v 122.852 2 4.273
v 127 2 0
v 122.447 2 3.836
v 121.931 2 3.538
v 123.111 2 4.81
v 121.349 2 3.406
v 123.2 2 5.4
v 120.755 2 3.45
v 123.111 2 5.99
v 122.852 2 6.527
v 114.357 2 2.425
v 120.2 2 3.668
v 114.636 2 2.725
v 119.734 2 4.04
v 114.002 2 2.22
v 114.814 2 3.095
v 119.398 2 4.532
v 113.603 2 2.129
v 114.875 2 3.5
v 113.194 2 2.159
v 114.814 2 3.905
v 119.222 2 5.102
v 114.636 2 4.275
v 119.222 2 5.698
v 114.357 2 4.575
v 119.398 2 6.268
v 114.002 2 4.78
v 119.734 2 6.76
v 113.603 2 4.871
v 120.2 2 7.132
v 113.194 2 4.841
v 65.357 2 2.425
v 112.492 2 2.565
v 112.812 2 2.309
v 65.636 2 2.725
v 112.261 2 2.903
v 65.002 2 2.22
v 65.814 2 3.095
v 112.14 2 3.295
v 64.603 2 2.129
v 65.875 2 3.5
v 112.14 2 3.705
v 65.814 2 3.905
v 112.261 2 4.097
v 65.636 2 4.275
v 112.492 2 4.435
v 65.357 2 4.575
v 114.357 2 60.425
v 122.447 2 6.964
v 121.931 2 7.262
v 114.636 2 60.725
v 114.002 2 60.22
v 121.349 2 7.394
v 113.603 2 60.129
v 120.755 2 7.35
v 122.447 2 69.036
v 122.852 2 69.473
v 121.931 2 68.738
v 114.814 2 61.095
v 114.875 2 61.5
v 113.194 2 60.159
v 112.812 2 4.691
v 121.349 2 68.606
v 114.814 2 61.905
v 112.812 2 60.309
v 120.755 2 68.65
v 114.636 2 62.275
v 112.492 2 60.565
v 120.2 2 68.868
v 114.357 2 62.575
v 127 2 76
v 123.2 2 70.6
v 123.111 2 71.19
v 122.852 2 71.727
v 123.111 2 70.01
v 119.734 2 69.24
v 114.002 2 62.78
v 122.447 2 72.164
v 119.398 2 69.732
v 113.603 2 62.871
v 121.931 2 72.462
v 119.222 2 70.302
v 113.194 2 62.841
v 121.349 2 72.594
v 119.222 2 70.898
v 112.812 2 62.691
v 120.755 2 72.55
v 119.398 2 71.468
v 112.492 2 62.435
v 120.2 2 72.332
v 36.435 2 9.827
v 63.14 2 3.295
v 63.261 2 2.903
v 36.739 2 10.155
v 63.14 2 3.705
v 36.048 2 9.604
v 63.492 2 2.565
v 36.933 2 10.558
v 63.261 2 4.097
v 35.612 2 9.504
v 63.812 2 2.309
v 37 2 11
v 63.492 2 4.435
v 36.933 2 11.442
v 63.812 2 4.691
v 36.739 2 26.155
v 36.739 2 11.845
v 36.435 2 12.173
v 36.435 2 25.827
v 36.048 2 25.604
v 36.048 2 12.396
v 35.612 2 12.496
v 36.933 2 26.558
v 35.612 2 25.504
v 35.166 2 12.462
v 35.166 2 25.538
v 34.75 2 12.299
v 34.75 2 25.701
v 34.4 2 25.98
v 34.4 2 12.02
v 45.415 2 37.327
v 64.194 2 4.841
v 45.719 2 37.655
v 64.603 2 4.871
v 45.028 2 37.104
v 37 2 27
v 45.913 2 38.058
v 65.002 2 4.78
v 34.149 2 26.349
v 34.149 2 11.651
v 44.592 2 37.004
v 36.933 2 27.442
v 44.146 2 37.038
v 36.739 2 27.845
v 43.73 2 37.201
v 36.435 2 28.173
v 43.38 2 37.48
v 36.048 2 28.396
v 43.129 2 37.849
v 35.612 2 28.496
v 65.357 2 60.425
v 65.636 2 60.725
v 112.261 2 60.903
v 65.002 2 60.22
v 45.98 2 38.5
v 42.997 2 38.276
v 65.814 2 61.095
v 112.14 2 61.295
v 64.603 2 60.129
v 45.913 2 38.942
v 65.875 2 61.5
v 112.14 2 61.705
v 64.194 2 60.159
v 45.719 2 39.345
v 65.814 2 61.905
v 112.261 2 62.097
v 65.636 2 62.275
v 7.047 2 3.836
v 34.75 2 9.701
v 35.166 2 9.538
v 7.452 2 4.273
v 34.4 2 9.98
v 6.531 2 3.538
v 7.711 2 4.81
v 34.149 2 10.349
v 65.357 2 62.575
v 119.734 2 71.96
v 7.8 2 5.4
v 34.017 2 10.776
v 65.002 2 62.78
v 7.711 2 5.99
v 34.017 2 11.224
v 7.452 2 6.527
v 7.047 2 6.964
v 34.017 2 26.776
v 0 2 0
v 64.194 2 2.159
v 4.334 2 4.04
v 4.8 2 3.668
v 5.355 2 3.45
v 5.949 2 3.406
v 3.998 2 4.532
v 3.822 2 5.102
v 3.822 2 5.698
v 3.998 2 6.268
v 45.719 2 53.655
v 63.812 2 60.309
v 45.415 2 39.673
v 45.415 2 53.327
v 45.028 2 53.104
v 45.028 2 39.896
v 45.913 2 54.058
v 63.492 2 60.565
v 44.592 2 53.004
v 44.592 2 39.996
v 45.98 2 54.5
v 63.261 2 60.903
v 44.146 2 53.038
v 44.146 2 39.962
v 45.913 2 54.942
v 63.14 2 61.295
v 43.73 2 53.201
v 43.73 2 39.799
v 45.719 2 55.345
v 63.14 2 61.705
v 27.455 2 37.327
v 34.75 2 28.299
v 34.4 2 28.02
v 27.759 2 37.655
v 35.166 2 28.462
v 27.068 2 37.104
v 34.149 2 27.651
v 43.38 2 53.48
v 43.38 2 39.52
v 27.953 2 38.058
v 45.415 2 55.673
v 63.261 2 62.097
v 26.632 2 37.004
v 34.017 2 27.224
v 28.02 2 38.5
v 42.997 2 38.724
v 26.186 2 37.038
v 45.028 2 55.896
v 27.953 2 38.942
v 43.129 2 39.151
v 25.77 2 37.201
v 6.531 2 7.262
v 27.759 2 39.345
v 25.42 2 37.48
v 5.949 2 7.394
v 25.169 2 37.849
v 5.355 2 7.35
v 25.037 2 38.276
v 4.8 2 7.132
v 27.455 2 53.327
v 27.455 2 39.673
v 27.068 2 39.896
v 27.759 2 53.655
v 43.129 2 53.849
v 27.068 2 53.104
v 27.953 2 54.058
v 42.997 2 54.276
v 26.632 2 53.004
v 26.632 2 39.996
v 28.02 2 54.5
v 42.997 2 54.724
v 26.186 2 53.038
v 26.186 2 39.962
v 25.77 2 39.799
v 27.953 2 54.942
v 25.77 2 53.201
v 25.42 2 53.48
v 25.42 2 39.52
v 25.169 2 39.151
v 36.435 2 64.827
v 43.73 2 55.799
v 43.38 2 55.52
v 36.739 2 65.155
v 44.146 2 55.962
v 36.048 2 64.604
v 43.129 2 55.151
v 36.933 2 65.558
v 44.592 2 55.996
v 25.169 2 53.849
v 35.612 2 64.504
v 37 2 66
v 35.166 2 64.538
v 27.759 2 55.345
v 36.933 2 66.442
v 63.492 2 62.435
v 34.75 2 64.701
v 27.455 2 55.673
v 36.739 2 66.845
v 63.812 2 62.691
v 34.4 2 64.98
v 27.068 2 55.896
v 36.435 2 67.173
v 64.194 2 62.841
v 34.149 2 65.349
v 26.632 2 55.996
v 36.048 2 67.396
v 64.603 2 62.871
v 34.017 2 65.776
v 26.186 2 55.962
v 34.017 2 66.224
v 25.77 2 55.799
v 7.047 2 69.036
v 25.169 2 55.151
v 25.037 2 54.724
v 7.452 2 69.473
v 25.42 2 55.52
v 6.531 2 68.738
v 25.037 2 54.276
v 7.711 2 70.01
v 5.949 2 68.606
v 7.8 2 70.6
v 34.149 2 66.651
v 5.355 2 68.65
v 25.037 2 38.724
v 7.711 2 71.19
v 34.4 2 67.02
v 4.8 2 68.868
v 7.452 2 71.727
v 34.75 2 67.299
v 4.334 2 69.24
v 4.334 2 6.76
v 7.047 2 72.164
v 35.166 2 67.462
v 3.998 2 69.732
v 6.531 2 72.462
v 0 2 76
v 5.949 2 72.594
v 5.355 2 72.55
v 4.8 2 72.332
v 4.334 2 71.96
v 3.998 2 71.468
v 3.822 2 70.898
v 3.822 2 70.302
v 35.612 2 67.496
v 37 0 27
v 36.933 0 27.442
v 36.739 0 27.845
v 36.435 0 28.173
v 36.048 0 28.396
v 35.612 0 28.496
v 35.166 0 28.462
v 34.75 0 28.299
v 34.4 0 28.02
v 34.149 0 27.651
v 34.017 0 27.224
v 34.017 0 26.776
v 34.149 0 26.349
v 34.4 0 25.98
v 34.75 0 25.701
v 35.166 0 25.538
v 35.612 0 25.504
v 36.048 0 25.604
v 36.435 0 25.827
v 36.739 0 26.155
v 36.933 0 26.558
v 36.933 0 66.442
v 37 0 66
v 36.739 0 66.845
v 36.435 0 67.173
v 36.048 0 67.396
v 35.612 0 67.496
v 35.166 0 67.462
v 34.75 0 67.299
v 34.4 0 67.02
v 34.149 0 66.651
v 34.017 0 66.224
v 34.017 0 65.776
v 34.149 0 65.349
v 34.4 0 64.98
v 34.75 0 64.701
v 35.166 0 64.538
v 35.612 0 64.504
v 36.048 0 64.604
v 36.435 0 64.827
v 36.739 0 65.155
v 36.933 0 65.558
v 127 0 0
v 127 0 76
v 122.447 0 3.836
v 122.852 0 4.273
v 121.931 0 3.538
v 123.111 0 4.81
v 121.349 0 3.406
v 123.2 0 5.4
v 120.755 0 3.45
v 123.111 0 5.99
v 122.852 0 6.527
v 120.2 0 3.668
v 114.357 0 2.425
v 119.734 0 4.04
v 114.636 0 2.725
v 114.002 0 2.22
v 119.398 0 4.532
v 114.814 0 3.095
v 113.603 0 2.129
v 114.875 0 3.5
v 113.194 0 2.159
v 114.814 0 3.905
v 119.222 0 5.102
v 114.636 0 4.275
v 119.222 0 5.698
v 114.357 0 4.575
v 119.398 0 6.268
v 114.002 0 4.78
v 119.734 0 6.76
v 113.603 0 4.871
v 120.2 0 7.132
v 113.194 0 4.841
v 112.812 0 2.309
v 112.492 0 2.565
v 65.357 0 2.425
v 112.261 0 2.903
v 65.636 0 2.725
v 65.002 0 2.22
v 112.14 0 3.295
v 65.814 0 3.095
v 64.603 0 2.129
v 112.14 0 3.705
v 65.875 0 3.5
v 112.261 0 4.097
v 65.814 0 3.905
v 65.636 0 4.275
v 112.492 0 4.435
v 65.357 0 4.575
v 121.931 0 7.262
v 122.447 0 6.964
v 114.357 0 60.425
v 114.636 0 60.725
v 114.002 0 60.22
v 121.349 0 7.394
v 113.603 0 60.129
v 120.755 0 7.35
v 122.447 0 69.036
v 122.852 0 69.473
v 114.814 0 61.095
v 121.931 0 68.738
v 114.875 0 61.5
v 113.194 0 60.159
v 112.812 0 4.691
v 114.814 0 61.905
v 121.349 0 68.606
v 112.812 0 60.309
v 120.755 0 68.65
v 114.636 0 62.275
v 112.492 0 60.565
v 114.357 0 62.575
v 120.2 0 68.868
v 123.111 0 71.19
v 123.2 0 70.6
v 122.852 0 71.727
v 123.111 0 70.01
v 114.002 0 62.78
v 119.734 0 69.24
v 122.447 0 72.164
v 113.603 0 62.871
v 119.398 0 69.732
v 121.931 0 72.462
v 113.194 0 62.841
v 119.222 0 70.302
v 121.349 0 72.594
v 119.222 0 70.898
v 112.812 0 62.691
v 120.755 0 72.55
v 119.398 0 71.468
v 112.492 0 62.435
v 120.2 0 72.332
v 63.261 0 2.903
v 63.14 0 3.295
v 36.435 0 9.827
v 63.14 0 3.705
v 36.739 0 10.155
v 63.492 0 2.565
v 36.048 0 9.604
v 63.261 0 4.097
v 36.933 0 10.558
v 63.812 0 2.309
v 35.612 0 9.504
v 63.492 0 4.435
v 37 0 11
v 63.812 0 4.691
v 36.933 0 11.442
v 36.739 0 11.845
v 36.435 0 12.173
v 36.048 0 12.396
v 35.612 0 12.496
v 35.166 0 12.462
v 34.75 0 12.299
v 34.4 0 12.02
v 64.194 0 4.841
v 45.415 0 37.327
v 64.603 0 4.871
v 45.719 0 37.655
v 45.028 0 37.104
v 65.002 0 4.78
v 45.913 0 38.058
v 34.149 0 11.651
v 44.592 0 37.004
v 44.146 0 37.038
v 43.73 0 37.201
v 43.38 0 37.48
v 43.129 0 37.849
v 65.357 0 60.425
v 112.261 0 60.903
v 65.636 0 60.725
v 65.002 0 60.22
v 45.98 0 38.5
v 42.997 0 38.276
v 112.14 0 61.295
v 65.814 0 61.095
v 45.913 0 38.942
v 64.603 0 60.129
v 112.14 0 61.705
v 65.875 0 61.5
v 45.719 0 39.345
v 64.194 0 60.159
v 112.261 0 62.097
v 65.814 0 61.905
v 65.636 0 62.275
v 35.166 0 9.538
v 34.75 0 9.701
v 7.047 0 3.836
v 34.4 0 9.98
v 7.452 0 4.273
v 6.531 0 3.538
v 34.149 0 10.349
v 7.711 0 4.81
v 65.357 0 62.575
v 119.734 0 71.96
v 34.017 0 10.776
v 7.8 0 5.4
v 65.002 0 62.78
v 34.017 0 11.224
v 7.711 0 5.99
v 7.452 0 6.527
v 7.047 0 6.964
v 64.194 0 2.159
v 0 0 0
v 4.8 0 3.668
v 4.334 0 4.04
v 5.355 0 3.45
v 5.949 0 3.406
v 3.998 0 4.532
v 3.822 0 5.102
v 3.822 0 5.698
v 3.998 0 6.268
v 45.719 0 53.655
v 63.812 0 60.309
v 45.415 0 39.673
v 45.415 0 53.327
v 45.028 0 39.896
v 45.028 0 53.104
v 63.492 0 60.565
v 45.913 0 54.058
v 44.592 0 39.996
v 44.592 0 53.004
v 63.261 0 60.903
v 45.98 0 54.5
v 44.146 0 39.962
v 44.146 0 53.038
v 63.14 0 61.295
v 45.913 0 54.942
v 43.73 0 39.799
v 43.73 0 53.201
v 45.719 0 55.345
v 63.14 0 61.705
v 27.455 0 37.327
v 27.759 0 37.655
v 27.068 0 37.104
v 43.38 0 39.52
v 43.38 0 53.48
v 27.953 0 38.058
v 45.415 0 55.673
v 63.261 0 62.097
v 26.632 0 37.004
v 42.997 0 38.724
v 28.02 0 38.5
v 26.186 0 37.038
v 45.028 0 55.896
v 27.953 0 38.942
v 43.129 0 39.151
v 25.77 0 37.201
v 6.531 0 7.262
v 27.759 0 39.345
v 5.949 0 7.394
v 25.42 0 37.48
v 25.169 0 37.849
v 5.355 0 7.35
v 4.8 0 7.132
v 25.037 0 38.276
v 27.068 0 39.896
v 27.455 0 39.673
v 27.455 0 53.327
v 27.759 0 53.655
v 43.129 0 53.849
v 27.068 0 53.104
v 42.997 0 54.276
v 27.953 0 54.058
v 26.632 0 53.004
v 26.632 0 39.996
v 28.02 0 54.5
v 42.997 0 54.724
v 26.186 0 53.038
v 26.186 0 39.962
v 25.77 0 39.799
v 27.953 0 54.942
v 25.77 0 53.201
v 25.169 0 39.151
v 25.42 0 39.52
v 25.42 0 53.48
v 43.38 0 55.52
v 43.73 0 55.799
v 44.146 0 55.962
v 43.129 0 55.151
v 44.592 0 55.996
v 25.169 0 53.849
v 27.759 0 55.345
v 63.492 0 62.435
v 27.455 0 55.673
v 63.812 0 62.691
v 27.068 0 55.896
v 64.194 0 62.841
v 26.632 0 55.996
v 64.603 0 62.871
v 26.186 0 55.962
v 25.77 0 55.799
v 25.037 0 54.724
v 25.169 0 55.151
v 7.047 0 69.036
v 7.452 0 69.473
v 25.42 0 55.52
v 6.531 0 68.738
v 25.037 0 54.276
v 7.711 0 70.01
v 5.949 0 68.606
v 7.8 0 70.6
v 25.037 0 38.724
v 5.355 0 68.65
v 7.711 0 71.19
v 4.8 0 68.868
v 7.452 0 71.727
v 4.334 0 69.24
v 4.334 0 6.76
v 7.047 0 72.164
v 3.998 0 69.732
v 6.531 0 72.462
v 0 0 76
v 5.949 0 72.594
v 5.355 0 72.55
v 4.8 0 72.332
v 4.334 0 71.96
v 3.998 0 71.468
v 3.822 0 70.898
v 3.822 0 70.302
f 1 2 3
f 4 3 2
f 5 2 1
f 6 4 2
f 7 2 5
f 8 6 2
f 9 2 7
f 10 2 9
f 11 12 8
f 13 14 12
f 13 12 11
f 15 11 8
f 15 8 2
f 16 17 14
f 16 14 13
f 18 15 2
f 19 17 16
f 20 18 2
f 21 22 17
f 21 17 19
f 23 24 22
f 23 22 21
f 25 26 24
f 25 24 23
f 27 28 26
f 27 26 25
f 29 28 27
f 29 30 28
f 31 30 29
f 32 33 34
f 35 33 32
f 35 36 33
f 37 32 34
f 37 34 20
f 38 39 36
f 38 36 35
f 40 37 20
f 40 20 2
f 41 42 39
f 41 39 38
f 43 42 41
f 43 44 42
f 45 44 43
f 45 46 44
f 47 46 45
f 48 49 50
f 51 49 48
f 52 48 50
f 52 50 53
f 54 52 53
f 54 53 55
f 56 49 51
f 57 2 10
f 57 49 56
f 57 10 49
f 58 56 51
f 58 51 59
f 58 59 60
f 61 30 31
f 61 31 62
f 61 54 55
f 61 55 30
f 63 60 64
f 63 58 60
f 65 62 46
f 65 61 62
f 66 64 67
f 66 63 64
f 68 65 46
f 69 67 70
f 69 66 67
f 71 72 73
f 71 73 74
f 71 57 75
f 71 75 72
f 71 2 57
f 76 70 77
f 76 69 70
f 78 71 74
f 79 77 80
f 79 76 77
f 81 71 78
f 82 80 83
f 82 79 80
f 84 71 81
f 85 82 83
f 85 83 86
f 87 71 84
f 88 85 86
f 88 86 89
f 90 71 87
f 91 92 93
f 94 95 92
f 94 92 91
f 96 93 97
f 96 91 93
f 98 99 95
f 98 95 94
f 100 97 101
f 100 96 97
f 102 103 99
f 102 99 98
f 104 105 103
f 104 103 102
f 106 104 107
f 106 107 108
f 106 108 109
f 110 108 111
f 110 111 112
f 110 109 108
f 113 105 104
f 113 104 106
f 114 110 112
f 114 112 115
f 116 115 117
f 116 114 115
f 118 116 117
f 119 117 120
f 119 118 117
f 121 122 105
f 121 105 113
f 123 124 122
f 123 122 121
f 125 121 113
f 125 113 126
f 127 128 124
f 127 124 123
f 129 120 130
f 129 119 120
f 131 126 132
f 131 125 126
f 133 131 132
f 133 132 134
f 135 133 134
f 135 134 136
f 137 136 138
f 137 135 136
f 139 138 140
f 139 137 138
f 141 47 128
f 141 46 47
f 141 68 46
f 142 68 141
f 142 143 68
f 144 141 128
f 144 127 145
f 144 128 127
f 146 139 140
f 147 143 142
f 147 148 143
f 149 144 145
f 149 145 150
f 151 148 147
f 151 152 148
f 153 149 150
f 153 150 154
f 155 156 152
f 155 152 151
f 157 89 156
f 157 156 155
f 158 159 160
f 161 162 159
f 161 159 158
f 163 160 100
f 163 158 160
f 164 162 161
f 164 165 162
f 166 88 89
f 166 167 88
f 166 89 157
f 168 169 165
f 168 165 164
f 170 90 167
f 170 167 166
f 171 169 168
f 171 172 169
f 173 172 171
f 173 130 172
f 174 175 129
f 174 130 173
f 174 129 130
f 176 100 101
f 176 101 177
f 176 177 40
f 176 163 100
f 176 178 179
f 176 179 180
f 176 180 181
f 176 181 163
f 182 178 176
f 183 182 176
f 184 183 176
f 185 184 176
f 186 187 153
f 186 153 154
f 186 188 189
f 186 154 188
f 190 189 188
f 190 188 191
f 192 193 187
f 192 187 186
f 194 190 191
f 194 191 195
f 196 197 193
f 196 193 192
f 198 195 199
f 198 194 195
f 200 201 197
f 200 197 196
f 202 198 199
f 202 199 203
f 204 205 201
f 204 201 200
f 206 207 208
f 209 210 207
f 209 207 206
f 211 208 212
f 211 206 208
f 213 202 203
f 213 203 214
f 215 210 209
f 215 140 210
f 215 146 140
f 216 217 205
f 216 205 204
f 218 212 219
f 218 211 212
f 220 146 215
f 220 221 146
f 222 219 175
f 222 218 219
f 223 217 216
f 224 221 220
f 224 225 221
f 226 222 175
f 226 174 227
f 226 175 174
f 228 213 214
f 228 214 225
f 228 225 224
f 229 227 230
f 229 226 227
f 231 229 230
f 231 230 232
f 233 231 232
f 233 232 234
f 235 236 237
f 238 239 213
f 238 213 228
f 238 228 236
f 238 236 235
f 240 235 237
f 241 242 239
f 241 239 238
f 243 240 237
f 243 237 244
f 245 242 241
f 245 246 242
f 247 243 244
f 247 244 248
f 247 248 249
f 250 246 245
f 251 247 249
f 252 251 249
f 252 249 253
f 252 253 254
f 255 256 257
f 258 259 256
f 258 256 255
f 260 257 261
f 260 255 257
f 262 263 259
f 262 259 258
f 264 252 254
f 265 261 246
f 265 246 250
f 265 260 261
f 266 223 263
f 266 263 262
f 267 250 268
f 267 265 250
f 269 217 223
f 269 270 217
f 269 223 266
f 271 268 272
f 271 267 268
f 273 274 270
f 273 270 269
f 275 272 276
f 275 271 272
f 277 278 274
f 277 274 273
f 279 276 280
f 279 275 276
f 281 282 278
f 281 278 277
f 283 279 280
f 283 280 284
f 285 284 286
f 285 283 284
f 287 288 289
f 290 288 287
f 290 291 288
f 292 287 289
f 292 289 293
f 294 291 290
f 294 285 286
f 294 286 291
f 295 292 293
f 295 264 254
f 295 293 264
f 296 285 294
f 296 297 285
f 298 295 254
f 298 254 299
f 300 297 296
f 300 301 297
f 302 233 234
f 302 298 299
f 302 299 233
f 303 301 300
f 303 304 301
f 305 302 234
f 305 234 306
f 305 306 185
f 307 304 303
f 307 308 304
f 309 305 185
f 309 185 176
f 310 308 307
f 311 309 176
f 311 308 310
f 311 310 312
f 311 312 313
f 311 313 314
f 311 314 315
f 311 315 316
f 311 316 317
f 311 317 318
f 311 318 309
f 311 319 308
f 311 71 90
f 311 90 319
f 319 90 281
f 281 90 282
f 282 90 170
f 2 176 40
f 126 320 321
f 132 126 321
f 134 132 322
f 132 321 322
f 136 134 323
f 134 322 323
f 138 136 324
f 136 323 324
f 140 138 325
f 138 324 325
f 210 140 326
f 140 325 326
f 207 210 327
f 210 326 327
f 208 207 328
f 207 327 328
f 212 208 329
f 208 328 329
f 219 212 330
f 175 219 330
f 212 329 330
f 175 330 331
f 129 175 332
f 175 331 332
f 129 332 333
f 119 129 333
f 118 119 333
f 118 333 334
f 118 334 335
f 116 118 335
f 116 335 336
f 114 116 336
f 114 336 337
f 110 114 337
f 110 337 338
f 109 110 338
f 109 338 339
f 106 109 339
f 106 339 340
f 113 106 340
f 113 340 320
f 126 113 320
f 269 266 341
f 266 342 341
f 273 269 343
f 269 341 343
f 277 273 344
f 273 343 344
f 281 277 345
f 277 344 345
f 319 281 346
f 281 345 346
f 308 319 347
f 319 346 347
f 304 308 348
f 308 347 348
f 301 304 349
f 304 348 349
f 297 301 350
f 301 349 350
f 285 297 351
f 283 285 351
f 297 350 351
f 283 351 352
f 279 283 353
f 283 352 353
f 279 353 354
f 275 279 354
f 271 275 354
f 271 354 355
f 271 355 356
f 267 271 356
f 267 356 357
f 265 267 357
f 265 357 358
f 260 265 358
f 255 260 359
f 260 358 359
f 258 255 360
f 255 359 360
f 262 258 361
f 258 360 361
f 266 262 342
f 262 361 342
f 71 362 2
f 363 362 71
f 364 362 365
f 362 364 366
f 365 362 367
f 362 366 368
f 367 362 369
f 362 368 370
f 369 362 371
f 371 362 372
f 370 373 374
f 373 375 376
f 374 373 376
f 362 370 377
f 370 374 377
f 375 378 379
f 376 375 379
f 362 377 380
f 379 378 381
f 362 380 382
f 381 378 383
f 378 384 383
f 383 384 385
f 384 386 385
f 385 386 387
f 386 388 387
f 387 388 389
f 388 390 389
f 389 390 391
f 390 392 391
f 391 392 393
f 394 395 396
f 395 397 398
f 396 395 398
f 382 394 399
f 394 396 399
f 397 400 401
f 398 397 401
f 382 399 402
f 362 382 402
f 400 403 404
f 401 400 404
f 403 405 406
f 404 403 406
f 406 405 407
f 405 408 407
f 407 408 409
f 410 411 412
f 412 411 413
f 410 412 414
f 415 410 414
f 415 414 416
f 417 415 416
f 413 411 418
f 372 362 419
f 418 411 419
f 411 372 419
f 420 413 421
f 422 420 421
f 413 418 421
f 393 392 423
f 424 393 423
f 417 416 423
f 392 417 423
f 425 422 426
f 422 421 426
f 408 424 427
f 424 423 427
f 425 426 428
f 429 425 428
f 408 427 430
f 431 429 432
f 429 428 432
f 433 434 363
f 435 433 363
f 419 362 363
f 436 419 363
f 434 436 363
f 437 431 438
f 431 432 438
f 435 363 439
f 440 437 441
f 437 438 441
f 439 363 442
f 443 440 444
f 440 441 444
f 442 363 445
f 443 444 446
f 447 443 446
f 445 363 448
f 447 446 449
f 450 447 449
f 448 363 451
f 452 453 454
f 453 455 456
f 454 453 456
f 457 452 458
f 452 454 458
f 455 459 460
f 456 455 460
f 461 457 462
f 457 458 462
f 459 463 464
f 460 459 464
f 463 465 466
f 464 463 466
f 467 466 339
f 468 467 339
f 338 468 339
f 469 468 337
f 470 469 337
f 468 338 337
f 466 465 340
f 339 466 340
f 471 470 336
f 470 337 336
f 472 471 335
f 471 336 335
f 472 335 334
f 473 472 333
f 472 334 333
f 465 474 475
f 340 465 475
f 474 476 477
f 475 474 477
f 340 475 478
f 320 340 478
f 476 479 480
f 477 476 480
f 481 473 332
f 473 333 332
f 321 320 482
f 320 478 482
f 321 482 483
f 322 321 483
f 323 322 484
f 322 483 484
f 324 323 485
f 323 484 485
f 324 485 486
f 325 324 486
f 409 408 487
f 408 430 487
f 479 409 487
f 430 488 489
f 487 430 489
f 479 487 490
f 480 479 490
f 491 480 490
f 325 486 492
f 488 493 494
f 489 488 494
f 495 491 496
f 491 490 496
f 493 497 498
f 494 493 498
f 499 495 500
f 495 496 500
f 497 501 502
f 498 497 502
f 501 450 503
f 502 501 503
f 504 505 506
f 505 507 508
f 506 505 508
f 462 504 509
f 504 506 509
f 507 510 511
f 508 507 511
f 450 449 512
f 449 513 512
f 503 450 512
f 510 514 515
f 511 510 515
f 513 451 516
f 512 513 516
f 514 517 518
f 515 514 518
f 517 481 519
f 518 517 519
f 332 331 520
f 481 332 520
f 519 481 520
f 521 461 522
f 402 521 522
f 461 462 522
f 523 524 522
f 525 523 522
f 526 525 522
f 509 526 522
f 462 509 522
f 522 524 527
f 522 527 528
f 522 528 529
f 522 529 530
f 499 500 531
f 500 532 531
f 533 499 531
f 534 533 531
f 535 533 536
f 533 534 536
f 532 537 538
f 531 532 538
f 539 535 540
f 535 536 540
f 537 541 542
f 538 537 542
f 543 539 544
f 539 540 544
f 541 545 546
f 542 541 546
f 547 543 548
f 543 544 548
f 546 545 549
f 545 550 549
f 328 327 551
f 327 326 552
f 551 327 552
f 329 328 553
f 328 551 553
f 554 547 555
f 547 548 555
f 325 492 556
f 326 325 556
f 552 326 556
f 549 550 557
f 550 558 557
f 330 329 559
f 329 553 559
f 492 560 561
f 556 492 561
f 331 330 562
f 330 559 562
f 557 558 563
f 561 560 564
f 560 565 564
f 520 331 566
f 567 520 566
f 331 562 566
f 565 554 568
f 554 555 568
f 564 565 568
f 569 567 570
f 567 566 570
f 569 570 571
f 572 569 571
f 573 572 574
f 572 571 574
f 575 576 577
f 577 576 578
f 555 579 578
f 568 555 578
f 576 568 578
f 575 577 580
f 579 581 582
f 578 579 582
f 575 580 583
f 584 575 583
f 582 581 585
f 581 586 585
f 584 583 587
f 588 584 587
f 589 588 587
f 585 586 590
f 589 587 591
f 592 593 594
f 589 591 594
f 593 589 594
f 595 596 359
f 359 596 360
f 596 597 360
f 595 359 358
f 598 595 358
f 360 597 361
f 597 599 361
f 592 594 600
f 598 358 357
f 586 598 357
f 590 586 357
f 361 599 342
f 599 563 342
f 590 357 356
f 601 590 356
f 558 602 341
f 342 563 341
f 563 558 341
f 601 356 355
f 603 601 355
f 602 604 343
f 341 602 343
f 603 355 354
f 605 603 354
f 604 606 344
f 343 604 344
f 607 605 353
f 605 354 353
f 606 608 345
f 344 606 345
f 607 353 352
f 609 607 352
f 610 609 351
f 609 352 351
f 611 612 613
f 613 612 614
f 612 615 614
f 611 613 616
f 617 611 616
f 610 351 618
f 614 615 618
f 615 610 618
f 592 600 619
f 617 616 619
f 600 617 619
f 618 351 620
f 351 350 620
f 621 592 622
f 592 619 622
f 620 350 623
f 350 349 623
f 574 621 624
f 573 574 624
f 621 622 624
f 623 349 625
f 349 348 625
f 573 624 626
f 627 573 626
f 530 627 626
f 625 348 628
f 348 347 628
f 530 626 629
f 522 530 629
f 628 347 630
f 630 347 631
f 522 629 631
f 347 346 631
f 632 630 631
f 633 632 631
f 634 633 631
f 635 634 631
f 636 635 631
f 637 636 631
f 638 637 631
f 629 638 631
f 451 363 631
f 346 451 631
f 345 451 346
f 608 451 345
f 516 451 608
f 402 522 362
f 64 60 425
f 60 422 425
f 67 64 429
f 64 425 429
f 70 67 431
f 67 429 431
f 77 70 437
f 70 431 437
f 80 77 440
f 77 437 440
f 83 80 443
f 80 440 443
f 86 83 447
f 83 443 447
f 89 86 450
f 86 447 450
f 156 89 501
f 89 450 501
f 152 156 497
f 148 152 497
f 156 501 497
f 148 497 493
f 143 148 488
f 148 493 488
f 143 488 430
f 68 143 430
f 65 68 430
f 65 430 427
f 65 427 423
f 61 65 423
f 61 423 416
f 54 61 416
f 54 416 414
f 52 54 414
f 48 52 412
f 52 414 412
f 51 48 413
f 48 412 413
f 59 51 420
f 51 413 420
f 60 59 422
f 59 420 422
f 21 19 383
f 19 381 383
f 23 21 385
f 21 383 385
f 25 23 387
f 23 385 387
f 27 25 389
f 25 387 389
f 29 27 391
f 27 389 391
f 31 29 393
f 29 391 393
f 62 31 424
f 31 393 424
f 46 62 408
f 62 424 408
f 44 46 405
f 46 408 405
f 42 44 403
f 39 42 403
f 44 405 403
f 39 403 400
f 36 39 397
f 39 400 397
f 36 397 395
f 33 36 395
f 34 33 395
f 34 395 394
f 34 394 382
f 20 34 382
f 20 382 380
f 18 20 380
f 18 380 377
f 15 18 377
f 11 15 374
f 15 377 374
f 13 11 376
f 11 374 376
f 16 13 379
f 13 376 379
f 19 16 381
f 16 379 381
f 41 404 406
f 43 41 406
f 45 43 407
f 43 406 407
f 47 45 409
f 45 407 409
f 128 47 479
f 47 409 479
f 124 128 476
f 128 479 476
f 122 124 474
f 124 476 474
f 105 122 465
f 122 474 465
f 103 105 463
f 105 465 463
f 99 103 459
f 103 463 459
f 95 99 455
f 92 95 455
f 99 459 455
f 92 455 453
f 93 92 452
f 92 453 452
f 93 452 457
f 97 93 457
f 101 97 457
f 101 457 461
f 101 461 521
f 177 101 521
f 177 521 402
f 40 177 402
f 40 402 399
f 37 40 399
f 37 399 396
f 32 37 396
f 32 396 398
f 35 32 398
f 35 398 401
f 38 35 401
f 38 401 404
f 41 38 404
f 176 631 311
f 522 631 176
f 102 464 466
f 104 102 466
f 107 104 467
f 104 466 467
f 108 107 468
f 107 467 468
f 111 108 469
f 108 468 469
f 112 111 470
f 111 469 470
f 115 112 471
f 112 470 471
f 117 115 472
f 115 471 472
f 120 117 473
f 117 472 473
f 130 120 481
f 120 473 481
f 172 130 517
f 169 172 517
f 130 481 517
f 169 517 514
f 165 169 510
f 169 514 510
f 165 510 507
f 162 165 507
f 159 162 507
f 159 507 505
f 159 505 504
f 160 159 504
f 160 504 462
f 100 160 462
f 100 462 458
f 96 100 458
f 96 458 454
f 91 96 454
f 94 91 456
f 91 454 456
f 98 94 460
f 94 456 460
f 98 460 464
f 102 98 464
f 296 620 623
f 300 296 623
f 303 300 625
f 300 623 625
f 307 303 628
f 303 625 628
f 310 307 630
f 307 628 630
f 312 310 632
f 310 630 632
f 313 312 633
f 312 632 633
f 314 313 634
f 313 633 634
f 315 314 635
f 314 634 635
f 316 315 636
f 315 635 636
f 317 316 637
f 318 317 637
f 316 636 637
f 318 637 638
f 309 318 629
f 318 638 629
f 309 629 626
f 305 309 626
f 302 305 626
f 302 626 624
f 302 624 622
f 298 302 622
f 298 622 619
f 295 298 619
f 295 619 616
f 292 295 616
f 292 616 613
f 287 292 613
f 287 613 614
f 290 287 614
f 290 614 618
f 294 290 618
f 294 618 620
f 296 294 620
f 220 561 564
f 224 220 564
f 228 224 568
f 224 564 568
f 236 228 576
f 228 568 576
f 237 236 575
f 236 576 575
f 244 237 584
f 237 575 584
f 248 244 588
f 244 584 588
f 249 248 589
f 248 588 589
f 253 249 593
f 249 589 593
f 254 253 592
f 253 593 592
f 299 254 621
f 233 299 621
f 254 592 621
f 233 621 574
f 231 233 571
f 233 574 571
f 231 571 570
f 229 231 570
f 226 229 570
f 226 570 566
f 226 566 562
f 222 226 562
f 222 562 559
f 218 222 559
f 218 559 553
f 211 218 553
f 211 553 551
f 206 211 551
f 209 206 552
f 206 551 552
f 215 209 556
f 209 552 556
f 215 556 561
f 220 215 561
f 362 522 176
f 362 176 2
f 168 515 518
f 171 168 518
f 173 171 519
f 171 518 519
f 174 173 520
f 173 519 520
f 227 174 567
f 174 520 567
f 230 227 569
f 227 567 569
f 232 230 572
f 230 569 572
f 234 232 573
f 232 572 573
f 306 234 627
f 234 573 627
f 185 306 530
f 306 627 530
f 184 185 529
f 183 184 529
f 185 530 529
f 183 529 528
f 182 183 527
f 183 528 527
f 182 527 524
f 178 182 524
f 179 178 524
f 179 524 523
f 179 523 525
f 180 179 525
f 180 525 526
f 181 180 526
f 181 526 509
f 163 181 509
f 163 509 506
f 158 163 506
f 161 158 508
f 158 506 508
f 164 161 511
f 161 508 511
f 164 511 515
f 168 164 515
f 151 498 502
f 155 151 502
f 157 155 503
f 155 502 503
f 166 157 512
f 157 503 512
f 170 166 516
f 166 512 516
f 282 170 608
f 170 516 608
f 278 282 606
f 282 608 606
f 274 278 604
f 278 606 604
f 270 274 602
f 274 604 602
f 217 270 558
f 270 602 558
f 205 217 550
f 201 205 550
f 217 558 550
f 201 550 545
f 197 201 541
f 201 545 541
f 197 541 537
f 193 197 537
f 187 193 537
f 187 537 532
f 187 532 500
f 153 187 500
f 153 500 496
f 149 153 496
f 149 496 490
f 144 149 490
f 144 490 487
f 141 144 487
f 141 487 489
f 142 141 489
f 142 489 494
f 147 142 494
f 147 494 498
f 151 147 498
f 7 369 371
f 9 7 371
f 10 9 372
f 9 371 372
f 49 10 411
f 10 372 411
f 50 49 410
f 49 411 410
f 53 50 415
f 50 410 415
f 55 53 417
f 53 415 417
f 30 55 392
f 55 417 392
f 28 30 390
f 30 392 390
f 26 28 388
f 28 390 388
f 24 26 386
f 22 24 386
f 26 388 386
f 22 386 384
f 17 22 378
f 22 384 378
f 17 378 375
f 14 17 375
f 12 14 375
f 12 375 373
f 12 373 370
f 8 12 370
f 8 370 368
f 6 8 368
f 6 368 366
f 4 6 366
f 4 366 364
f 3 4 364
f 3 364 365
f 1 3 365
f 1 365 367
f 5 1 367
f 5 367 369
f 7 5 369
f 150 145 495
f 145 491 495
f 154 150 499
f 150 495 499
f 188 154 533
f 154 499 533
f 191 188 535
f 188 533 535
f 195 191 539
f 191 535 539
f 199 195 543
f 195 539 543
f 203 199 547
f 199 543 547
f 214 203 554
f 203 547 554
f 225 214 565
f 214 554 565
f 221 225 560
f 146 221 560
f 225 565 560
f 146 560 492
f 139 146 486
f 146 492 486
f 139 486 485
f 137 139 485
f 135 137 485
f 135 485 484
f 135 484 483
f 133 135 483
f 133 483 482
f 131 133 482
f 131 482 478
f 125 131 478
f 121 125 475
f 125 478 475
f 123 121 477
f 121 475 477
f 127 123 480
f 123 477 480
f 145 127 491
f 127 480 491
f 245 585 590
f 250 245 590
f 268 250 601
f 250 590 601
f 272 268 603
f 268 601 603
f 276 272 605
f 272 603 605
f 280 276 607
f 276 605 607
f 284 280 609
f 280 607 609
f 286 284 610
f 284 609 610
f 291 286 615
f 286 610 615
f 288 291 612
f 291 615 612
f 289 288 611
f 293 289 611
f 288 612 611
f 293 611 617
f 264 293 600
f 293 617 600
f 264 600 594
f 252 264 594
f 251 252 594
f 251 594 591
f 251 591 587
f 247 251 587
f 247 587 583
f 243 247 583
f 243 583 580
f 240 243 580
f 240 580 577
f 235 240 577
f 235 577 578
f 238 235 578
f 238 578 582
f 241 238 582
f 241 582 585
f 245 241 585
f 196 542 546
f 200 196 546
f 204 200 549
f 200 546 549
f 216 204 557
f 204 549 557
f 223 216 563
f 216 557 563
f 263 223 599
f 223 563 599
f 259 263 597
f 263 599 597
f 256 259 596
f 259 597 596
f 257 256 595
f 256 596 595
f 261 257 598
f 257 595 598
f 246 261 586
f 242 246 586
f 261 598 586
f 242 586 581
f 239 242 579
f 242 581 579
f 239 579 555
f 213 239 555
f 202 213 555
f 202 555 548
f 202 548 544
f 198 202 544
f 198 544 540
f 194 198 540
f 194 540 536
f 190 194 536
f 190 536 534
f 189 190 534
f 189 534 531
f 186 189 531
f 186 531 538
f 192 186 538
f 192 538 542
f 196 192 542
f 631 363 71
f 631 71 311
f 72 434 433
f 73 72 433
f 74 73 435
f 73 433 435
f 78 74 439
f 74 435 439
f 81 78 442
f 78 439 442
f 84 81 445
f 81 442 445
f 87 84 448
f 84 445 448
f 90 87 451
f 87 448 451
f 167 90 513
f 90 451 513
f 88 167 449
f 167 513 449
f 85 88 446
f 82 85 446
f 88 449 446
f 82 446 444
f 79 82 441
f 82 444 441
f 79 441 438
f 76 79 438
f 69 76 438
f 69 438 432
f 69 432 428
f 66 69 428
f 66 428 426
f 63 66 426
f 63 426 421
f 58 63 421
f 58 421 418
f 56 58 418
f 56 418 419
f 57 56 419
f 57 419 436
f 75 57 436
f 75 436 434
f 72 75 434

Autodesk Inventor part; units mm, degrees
ref_plane "YZ Plane" through (0, 0, 0) normal (1, 0, 0) x (0, 1, 0)
ref_plane "XZ Plane" through (0, 0, 0) normal (0, 1, 0) x (-1, 0, 0)
ref_plane "XY Plane" through (0, 0, 0) normal (0, 0, 1) x (1, 0, 0)
sketch "Sketch1" plane through (0, 0, 0) normal (0, 1, 0) x (-1, 0, 0)
  line L0 (0, 0) -> (-127, 0)
  line L1 (-127, 0) -> (-127, 76)
  line L2 (-127, 76) -> (0, 76)
  line L3 (0, 76) -> (0, 0)
  dimension "d0" = 76
  dimension "d1" = 127
extrude "Extrusion1" add sketch "Sketch1" along normal blind 2
sketch "Sketch2" plane through (0, 0, 0) normal (0, -1, 0) x (1, 0, 0)
  line L0 (0, 0) -> (127, 0) projected
  line L1 (127, 0) -> (127, 76) projected
  line L2 (127, 76) -> (0, 76) projected
  line L3 (0, 76) -> (0, 0) projected
  line L4 (0, 5.4) -> (127, 5.4) construction
  line L5 (0, 38) -> (127, 38) construction
  line L6 (63.5, 76) -> (63.5, 0) construction
  line L7 (121.2, 76) -> (121.2, 0) construction
  line L8 (0, 70.6) -> (127, 70.6) construction
  line L9 (5.8, 76) -> (5.8, 0) construction
  circle A0 centre (121.2, 70.6) radius 2
  circle A1 centre (121.2, 5.4) radius 2
  circle A2 centre (5.8, 70.6) radius 2
  circle A3 centre (5.8, 5.4) radius 2
  dimension "d5" = 32.6
  dimension "d6" = 57.7
  dimension "d7" = 4
extrude "Extrusion2" cut sketch "Sketch2" against normal through all contours A0 | A1 | A2 | A3
sketch "Sketch3" plane through (0, 0, 0) normal (0, -1, 0) x (1, 0, 0)
  line L0 (0, 0) -> (127, 0) projected
  line L1 (0, 76) -> (0, 0) projected
  line L2 (10, 93) -> (61, 93)
  line L3 (61, 93) -> (61, 0)
  line L4 (61, 0) -> (10, 0)
  line L5 (10, 0) -> (10, 93)
  line L6 (61, 0) -> (117, 0)
  line L7 (117, 0) -> (117, 85)
  line L8 (117, 85) -> (61, 85)
  line L9 (61, 85) -> (61, 0)
  line L10 (35.5, 93) -> (35.5, 0) construction
  circle A0 centre (35.5, 27) radius 1.5
  circle A1 centre (35.5, 82) radius 1.5
  line L11 (89, 85) -> (89, 0) construction
  line L12 (117, 42.5) -> (61, 42.5) construction
  circle A2 centre (113.5, 3.5) radius 1.375
  circle A3 centre (113.5, 61.5) radius 1.375
  circle A4 centre (64.5, 3.5) radius 1.375
  circle A5 centre (64.5, 61.5) radius 1.375
  line L13 (35.5, 82) -> (35.5, 27) construction
  circle A6 centre (44.48, 54.5) radius 1.5
  circle A7 centre (26.52, 54.5) radius 1.5
  circle A8 centre (35.5, 11) radius 1.5
  circle A9 centre (35.5, 66) radius 1.5
  line L14 (35.5, 66) -> (35.5, 11) construction
  circle A10 centre (44.48, 38.5) radius 1.5
  circle A11 centre (26.52, 38.5) radius 1.5
  dimension "d10" = 93
  dimension "d12" = 51
  dimension "d13" = 10
  dimension "d14" = 56
  dimension "d15" = 85
  dimension "d16" = 27
  dimension "d17" = 3
  dimension "d20" = 55
  dimension "d25" = 0
  dimension "d27" = 2.75
  dimension "d31" = 58
  dimension "d34" = 49
  dimension "d39" = 3.5
  dimension "d41" = 3.5
  dimension "d42" = 3
  dimension "d43" = 8.98
  dimension "d44" = 27.5
  dimension "d45" = 3
  dimension "d46" = 55
  dimension "d47" = 3
  dimension "d48" = 27.5
  dimension "d49" = 11
  dimension "d50" = 8.98
  dimension "d51" = 8.98
  dimension "d52" = 3
extrude "Extrusion3" cut sketch "Sketch3" against normal through all contours A0 | A1 | A2 | A3 | A4 | A5 | A6 | A7 | A8 | A9 | A10 | A11
properties part number "base_ps_rpi"
